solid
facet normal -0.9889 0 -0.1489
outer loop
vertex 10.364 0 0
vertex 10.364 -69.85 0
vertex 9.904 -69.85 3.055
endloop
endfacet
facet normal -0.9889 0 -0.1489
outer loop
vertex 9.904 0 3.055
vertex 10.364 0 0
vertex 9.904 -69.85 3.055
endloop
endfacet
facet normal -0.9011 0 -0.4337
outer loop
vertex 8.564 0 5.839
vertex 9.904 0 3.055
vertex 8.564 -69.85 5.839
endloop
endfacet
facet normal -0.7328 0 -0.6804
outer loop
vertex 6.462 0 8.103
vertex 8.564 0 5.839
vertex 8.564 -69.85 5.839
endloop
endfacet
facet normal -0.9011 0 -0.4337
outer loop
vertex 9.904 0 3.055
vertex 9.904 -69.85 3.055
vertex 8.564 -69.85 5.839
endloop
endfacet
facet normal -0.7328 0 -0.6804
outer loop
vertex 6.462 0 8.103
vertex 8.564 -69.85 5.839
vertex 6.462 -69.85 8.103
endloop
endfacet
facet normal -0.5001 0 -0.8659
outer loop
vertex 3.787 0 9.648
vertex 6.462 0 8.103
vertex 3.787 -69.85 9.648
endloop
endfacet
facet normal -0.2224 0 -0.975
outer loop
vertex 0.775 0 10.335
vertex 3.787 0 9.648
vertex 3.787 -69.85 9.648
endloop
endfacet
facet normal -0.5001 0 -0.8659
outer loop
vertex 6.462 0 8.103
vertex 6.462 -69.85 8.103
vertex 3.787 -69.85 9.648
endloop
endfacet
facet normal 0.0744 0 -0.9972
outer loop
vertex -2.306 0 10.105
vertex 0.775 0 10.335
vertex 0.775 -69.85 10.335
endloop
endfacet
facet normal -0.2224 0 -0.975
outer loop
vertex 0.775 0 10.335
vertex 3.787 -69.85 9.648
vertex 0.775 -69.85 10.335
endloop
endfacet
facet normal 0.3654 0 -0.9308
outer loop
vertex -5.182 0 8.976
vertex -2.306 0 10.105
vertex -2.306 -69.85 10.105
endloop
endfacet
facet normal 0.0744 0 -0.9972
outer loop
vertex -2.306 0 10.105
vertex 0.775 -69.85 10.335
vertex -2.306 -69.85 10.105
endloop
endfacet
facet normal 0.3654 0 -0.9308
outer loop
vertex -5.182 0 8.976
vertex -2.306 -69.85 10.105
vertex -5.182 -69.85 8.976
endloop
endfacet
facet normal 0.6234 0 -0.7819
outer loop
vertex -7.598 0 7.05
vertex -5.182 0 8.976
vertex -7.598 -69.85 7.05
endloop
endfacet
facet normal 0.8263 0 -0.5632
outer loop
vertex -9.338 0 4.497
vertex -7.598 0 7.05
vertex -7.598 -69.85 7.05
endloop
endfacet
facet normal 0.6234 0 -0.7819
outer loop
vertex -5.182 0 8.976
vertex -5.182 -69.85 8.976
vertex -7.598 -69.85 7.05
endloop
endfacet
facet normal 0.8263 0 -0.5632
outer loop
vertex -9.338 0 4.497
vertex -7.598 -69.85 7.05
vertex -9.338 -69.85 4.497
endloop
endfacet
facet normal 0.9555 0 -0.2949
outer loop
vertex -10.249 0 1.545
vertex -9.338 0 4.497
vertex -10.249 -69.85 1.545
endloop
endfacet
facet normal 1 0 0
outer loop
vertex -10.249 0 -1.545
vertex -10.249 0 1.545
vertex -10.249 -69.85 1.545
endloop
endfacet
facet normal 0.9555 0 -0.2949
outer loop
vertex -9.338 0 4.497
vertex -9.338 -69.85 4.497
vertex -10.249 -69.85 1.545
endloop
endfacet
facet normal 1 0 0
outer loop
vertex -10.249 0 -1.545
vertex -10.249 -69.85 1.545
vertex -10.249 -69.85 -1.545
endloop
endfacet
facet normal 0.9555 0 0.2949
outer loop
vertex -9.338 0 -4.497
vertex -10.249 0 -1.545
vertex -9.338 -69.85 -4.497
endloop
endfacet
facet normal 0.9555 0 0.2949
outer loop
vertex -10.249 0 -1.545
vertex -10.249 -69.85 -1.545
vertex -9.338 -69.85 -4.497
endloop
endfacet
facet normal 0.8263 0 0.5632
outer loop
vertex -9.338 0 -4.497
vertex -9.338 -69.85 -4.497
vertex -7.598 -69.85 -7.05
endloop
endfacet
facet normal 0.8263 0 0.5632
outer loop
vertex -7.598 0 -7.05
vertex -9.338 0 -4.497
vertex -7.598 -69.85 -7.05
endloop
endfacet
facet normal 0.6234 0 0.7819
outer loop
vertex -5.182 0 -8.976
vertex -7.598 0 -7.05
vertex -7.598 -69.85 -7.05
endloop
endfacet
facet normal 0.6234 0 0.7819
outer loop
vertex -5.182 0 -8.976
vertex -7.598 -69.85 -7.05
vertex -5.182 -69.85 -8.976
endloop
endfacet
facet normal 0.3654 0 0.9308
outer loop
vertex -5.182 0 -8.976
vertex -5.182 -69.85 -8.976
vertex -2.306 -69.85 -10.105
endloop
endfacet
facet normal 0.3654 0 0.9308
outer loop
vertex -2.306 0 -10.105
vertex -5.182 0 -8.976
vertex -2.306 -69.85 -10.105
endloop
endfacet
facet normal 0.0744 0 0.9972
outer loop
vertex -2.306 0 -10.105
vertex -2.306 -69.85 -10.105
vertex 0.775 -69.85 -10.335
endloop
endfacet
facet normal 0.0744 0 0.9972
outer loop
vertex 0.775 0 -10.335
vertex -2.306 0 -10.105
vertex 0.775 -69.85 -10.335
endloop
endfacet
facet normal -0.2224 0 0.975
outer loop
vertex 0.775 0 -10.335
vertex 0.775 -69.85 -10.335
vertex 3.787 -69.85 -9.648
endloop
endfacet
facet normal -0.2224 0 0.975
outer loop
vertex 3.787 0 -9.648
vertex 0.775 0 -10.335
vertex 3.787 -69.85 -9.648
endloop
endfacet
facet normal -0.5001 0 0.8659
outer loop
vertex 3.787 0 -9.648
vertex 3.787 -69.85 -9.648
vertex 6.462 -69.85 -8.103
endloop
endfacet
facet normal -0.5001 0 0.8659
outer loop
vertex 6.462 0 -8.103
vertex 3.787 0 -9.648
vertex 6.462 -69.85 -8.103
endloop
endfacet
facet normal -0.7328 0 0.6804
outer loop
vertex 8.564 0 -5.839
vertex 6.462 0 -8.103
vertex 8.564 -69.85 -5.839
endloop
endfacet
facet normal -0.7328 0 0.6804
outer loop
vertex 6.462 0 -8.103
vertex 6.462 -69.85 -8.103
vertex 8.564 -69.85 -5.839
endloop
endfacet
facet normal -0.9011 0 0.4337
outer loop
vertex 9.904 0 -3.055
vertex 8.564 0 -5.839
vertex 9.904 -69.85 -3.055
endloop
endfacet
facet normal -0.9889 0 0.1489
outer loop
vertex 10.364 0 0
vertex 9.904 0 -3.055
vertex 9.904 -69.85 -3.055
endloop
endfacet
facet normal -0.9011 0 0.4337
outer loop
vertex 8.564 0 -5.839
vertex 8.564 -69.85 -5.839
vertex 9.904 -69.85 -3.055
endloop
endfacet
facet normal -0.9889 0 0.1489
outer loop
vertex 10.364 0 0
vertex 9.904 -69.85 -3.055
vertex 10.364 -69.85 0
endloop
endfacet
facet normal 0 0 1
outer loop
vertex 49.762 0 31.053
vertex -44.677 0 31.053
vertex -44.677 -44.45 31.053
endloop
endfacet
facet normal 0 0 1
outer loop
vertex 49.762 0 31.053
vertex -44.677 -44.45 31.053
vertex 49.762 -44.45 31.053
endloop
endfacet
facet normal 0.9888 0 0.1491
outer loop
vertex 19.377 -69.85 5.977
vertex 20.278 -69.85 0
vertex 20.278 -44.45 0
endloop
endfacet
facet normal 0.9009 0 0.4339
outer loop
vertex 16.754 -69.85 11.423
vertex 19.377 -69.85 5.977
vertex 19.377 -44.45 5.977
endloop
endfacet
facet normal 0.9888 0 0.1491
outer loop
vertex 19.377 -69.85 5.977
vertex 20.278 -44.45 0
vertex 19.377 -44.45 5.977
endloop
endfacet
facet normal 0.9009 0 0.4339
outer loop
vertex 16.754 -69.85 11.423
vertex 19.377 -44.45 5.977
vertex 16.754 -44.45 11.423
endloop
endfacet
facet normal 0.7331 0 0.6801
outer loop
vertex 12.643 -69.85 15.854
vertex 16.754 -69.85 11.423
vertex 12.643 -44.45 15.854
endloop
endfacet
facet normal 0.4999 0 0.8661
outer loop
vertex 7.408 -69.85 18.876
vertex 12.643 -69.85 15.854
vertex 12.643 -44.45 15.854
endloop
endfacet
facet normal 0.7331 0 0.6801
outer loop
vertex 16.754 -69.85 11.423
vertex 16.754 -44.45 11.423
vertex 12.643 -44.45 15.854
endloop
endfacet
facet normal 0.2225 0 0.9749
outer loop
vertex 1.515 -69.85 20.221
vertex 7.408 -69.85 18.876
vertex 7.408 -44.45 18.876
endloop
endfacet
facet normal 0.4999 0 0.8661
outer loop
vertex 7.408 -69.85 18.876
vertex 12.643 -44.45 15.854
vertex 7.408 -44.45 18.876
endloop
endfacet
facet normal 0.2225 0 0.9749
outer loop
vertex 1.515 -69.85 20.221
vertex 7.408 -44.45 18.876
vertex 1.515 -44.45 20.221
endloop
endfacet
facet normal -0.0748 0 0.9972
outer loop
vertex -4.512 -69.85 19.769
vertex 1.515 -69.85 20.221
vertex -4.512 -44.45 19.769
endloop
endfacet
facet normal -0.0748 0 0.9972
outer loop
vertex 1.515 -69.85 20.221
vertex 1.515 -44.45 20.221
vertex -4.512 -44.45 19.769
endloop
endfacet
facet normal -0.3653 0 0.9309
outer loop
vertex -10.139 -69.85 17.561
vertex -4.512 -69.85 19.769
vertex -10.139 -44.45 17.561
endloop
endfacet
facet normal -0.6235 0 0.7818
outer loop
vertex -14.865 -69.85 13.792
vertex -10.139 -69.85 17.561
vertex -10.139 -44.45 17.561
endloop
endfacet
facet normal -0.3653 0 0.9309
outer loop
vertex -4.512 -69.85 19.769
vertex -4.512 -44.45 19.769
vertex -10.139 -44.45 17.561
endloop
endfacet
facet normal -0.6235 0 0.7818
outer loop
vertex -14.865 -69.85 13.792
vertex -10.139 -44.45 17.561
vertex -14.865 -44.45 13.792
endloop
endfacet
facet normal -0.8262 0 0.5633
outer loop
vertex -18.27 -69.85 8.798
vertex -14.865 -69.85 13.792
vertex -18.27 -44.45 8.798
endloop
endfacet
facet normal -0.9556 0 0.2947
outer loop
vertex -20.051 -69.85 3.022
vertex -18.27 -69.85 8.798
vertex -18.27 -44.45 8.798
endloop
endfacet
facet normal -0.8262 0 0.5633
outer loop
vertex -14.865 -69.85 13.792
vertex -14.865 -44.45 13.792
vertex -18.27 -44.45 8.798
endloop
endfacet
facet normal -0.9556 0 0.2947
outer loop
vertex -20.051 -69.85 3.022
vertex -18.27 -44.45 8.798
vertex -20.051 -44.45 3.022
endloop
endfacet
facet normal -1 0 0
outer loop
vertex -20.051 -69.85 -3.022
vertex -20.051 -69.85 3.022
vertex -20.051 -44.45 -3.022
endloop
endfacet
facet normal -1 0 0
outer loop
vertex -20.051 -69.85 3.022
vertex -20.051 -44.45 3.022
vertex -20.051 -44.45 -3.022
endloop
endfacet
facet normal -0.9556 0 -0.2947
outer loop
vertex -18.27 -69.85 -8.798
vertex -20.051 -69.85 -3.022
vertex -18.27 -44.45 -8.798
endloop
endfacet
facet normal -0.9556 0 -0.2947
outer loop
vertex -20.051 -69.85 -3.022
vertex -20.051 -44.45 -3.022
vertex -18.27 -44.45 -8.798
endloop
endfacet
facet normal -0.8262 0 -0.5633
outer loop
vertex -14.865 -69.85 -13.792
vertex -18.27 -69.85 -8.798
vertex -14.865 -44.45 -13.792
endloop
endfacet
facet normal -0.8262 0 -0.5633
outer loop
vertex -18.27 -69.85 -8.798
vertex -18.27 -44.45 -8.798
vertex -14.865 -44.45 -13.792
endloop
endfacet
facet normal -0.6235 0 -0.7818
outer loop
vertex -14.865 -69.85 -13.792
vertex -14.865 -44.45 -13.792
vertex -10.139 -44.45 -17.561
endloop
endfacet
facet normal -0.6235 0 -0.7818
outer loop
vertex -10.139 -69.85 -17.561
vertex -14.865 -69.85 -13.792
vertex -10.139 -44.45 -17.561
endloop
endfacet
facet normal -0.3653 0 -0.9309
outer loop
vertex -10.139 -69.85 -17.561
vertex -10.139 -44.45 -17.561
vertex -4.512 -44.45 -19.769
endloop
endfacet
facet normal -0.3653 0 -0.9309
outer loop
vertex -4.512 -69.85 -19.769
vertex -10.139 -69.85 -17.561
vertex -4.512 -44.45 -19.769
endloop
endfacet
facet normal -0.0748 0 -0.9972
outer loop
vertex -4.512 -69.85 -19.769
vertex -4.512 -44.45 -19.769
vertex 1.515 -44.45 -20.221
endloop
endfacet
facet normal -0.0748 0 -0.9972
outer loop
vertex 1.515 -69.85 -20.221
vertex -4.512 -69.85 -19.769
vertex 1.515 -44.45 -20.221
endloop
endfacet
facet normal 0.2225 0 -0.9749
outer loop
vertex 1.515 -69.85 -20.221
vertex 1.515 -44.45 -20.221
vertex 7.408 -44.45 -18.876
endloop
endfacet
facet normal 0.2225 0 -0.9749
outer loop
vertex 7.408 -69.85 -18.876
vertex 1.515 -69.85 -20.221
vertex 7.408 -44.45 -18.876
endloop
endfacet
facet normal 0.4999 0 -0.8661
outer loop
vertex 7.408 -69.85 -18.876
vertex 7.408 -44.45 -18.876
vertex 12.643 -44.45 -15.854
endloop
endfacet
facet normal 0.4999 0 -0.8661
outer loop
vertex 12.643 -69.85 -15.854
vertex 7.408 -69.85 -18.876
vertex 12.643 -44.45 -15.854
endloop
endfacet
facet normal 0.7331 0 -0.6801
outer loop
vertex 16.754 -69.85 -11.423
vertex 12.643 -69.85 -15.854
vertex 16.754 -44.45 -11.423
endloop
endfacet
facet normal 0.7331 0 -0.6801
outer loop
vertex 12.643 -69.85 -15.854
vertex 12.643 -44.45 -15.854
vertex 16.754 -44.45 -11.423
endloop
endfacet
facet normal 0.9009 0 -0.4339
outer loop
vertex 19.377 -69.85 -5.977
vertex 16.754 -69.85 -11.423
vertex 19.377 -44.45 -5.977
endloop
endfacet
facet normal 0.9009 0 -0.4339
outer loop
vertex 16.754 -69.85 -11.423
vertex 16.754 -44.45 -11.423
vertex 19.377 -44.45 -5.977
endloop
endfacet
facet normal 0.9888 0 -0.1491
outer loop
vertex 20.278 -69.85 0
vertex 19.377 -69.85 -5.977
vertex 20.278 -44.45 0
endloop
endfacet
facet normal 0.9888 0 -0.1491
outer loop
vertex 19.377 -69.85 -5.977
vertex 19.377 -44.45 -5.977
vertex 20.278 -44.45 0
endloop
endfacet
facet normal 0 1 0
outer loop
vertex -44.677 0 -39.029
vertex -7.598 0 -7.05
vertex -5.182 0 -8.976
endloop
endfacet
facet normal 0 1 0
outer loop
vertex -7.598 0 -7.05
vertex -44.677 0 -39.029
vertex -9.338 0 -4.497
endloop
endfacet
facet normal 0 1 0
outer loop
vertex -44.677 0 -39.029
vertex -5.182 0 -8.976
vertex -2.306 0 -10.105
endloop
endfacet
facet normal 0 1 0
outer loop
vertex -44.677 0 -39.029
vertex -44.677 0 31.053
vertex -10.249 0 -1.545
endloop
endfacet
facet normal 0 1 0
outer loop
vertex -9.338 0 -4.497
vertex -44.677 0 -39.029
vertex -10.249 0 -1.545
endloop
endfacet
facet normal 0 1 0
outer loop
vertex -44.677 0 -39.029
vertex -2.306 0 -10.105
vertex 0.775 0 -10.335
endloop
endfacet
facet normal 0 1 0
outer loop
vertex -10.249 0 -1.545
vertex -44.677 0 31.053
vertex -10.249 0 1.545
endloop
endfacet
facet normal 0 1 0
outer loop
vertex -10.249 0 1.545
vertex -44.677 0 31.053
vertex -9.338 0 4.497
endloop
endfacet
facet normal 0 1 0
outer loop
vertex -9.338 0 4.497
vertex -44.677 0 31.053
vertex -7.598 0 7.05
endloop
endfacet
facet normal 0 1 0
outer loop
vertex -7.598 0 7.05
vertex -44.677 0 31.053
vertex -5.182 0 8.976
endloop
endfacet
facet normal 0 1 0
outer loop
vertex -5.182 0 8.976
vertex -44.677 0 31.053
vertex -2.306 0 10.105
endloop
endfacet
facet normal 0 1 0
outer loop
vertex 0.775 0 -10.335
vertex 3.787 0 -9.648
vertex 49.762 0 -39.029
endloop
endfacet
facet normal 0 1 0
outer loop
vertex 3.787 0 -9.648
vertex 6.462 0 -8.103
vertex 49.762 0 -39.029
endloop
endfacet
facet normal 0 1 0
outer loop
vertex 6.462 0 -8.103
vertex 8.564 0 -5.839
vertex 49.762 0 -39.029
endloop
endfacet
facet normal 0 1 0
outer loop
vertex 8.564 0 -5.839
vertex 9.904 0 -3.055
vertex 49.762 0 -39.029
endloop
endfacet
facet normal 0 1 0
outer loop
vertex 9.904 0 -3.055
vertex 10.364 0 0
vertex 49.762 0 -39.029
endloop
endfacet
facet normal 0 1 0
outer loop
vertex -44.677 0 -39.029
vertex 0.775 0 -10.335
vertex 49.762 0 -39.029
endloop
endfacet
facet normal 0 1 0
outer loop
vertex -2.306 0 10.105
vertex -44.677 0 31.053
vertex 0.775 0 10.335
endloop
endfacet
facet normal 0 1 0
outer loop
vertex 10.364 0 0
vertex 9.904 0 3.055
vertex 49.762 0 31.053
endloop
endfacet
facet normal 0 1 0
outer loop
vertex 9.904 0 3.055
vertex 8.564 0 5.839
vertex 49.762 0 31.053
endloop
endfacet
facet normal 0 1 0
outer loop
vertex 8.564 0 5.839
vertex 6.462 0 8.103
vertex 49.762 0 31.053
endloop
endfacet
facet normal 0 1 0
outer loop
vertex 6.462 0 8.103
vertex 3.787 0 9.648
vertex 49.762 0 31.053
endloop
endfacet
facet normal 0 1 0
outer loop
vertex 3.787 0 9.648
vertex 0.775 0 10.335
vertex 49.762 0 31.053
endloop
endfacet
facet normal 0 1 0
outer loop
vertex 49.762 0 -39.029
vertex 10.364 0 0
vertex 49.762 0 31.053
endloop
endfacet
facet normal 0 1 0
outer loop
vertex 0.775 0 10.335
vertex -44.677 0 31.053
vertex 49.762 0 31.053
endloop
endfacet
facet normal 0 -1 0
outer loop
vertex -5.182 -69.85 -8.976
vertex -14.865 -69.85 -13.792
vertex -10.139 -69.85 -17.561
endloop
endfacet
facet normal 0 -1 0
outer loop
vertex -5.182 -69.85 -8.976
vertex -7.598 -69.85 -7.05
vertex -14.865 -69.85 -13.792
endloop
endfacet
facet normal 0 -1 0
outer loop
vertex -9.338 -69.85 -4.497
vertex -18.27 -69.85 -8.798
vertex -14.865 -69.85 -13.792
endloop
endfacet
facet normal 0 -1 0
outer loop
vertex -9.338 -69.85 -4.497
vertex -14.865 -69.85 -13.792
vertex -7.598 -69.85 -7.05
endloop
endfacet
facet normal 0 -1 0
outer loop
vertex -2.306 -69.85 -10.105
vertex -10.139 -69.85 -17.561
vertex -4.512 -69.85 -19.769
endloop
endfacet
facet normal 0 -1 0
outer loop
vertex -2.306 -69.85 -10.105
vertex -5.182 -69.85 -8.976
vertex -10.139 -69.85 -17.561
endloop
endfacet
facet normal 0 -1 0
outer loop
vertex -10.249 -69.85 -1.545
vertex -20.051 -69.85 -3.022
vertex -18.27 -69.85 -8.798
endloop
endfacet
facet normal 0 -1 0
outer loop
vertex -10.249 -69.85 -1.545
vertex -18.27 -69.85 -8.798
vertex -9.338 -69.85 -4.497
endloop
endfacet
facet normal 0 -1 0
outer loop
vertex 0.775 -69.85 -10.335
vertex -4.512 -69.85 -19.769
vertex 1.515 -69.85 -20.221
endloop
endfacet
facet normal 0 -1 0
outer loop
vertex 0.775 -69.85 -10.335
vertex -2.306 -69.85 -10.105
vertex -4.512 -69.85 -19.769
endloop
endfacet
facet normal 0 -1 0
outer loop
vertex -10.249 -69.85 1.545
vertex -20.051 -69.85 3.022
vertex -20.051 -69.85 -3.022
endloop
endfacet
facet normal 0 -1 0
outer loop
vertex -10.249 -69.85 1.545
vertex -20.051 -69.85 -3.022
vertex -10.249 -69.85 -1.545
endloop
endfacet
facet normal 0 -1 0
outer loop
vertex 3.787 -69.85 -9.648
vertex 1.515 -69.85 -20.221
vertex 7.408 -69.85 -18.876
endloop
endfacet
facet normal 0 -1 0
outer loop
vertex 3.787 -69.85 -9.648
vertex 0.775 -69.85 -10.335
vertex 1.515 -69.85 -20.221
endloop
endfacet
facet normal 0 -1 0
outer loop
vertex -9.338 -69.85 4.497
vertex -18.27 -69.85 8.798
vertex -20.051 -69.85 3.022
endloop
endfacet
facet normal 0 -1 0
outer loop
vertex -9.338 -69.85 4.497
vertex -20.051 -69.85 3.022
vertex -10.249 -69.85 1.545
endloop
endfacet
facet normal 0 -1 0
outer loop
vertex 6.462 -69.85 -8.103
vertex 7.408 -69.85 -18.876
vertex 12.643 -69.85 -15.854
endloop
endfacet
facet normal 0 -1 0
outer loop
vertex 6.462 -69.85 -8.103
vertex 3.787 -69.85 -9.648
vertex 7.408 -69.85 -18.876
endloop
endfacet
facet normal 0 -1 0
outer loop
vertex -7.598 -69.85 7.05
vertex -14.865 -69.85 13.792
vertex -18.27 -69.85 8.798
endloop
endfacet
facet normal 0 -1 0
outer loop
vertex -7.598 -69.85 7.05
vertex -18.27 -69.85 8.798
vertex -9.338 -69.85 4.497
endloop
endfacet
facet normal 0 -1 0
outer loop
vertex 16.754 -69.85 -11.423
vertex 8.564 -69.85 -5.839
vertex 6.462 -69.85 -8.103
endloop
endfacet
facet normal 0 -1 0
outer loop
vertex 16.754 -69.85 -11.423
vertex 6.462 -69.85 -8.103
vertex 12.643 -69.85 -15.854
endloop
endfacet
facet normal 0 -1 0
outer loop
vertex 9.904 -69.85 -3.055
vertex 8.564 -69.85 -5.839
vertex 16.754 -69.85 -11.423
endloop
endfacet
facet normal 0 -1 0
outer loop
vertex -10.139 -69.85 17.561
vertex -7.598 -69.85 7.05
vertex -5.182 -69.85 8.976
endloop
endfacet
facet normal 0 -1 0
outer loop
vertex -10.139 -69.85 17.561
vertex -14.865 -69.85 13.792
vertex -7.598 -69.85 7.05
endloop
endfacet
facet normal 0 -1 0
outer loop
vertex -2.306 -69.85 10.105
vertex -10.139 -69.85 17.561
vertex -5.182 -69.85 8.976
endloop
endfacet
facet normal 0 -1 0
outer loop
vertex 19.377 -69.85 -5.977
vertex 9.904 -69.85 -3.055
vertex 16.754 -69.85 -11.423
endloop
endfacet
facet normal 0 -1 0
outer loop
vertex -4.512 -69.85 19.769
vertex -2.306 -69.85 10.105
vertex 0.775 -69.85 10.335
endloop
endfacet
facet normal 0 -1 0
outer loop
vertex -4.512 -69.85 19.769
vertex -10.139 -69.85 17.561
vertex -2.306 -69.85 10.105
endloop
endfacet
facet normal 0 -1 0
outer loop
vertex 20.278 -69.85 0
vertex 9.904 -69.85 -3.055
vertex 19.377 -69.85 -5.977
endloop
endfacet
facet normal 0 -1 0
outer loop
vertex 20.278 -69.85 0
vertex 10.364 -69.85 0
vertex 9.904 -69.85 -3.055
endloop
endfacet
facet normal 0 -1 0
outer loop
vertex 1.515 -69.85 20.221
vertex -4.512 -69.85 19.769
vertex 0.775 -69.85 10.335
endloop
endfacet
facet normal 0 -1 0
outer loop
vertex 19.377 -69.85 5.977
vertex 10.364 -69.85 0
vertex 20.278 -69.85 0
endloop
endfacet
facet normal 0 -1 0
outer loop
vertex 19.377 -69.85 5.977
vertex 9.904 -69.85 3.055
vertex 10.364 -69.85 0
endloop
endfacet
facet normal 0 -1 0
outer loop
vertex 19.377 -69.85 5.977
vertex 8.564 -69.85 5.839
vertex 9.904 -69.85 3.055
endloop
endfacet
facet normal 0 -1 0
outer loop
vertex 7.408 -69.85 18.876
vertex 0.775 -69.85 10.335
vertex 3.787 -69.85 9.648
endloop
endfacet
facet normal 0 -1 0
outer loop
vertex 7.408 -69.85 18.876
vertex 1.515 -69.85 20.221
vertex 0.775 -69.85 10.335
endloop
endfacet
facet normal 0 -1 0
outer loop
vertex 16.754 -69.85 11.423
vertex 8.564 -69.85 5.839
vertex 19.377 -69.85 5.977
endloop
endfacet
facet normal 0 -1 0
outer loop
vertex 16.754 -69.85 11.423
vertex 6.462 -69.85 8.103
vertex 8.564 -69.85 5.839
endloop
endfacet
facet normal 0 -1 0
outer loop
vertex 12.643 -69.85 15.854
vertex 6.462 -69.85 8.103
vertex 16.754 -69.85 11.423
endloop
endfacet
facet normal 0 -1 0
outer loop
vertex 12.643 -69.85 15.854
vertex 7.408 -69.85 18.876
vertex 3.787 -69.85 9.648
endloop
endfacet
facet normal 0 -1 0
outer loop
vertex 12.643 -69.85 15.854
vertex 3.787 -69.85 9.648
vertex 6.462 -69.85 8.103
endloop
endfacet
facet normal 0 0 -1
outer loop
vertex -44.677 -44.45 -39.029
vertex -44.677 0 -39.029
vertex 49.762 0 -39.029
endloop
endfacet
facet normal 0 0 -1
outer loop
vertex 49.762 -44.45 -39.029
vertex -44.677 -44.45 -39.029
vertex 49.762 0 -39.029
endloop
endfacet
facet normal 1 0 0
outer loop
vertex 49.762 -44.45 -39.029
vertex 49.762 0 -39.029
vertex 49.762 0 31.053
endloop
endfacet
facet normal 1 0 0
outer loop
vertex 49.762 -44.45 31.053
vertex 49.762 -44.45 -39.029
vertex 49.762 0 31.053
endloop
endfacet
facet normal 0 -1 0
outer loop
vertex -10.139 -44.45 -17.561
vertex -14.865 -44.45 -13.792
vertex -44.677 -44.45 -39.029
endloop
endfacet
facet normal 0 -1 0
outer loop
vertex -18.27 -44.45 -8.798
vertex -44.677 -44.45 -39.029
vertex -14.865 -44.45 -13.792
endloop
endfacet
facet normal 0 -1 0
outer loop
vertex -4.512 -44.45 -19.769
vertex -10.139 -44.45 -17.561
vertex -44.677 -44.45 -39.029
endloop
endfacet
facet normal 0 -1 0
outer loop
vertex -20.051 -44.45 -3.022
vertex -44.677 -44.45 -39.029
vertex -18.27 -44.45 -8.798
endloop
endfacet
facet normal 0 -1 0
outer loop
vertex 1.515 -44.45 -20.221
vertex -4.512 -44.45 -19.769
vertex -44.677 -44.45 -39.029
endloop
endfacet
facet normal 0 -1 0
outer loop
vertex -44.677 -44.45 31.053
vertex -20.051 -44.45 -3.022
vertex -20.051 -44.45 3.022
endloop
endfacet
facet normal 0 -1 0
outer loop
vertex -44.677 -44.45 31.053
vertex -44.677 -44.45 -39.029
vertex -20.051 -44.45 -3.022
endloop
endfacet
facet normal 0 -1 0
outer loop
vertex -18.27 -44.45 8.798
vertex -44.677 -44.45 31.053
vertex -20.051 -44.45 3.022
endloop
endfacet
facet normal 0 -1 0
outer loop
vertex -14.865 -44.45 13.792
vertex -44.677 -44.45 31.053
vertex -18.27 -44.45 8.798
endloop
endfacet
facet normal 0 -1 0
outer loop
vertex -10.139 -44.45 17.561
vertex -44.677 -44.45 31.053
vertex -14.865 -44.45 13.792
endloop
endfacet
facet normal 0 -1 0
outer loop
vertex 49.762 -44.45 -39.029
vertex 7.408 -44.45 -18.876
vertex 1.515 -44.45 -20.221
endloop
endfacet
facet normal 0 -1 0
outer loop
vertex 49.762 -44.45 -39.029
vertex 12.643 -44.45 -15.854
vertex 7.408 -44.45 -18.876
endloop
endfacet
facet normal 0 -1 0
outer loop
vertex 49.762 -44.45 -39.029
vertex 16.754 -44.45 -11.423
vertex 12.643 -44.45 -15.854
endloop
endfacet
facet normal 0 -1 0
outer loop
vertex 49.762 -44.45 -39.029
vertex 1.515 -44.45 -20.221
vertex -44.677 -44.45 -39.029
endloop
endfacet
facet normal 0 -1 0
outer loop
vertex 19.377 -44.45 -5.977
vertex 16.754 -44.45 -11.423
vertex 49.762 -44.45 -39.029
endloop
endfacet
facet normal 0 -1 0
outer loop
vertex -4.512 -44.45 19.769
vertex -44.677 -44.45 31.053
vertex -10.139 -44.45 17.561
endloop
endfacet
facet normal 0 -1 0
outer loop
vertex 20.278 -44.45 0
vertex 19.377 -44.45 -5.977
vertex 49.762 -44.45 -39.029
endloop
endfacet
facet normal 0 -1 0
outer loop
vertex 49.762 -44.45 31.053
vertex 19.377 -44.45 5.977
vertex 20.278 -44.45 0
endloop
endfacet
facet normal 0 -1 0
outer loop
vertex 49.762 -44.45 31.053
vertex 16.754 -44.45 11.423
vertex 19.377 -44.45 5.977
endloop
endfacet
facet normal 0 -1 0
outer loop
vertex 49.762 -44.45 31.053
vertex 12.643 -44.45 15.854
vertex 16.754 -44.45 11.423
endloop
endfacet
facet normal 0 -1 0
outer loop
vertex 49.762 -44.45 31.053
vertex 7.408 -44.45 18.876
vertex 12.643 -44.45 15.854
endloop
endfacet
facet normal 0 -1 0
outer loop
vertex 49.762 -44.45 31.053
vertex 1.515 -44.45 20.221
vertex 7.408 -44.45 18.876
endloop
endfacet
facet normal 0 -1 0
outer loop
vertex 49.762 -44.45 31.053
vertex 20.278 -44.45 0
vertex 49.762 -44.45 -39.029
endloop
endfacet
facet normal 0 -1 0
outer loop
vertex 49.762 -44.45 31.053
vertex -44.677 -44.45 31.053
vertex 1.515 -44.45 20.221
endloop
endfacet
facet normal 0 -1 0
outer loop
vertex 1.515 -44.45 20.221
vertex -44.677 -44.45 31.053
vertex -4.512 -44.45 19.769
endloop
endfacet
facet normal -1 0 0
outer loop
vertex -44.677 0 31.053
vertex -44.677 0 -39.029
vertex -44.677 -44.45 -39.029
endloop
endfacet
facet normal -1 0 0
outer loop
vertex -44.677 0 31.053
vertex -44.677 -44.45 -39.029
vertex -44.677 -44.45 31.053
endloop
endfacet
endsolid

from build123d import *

# Parameters (mm, degrees)
F0_W     = 94.439332
F0_H     = 70.08286
F1_DEPTH = 44.45
F2_R     = 20.277827
F3_DEPTH = 25.4
F4_R     = 10.364463
F5_DEPTH = 69.85


with BuildPart() as f1:
    # F0 (on Front) → F1 (new body)
    with BuildSketch(Plane.XZ):
        with Locations((2.542602, -3.987971)):
            Rectangle(F0_W, F0_H)
    extrude(amount=F1_DEPTH)

    # F2 (on face) → F3 (join)
    with BuildSketch(Plane.XZ.offset(44.45)):
        Circle(F2_R)
    extrude(amount=F3_DEPTH)

    # F4 (on face) → F5 (cut, through all)
    with BuildSketch(Plane.XZ.offset(69.85)):
        Circle(F4_R)
    extrude(amount=-F5_DEPTH, mode=Mode.SUBTRACT)


solid = f1.part
